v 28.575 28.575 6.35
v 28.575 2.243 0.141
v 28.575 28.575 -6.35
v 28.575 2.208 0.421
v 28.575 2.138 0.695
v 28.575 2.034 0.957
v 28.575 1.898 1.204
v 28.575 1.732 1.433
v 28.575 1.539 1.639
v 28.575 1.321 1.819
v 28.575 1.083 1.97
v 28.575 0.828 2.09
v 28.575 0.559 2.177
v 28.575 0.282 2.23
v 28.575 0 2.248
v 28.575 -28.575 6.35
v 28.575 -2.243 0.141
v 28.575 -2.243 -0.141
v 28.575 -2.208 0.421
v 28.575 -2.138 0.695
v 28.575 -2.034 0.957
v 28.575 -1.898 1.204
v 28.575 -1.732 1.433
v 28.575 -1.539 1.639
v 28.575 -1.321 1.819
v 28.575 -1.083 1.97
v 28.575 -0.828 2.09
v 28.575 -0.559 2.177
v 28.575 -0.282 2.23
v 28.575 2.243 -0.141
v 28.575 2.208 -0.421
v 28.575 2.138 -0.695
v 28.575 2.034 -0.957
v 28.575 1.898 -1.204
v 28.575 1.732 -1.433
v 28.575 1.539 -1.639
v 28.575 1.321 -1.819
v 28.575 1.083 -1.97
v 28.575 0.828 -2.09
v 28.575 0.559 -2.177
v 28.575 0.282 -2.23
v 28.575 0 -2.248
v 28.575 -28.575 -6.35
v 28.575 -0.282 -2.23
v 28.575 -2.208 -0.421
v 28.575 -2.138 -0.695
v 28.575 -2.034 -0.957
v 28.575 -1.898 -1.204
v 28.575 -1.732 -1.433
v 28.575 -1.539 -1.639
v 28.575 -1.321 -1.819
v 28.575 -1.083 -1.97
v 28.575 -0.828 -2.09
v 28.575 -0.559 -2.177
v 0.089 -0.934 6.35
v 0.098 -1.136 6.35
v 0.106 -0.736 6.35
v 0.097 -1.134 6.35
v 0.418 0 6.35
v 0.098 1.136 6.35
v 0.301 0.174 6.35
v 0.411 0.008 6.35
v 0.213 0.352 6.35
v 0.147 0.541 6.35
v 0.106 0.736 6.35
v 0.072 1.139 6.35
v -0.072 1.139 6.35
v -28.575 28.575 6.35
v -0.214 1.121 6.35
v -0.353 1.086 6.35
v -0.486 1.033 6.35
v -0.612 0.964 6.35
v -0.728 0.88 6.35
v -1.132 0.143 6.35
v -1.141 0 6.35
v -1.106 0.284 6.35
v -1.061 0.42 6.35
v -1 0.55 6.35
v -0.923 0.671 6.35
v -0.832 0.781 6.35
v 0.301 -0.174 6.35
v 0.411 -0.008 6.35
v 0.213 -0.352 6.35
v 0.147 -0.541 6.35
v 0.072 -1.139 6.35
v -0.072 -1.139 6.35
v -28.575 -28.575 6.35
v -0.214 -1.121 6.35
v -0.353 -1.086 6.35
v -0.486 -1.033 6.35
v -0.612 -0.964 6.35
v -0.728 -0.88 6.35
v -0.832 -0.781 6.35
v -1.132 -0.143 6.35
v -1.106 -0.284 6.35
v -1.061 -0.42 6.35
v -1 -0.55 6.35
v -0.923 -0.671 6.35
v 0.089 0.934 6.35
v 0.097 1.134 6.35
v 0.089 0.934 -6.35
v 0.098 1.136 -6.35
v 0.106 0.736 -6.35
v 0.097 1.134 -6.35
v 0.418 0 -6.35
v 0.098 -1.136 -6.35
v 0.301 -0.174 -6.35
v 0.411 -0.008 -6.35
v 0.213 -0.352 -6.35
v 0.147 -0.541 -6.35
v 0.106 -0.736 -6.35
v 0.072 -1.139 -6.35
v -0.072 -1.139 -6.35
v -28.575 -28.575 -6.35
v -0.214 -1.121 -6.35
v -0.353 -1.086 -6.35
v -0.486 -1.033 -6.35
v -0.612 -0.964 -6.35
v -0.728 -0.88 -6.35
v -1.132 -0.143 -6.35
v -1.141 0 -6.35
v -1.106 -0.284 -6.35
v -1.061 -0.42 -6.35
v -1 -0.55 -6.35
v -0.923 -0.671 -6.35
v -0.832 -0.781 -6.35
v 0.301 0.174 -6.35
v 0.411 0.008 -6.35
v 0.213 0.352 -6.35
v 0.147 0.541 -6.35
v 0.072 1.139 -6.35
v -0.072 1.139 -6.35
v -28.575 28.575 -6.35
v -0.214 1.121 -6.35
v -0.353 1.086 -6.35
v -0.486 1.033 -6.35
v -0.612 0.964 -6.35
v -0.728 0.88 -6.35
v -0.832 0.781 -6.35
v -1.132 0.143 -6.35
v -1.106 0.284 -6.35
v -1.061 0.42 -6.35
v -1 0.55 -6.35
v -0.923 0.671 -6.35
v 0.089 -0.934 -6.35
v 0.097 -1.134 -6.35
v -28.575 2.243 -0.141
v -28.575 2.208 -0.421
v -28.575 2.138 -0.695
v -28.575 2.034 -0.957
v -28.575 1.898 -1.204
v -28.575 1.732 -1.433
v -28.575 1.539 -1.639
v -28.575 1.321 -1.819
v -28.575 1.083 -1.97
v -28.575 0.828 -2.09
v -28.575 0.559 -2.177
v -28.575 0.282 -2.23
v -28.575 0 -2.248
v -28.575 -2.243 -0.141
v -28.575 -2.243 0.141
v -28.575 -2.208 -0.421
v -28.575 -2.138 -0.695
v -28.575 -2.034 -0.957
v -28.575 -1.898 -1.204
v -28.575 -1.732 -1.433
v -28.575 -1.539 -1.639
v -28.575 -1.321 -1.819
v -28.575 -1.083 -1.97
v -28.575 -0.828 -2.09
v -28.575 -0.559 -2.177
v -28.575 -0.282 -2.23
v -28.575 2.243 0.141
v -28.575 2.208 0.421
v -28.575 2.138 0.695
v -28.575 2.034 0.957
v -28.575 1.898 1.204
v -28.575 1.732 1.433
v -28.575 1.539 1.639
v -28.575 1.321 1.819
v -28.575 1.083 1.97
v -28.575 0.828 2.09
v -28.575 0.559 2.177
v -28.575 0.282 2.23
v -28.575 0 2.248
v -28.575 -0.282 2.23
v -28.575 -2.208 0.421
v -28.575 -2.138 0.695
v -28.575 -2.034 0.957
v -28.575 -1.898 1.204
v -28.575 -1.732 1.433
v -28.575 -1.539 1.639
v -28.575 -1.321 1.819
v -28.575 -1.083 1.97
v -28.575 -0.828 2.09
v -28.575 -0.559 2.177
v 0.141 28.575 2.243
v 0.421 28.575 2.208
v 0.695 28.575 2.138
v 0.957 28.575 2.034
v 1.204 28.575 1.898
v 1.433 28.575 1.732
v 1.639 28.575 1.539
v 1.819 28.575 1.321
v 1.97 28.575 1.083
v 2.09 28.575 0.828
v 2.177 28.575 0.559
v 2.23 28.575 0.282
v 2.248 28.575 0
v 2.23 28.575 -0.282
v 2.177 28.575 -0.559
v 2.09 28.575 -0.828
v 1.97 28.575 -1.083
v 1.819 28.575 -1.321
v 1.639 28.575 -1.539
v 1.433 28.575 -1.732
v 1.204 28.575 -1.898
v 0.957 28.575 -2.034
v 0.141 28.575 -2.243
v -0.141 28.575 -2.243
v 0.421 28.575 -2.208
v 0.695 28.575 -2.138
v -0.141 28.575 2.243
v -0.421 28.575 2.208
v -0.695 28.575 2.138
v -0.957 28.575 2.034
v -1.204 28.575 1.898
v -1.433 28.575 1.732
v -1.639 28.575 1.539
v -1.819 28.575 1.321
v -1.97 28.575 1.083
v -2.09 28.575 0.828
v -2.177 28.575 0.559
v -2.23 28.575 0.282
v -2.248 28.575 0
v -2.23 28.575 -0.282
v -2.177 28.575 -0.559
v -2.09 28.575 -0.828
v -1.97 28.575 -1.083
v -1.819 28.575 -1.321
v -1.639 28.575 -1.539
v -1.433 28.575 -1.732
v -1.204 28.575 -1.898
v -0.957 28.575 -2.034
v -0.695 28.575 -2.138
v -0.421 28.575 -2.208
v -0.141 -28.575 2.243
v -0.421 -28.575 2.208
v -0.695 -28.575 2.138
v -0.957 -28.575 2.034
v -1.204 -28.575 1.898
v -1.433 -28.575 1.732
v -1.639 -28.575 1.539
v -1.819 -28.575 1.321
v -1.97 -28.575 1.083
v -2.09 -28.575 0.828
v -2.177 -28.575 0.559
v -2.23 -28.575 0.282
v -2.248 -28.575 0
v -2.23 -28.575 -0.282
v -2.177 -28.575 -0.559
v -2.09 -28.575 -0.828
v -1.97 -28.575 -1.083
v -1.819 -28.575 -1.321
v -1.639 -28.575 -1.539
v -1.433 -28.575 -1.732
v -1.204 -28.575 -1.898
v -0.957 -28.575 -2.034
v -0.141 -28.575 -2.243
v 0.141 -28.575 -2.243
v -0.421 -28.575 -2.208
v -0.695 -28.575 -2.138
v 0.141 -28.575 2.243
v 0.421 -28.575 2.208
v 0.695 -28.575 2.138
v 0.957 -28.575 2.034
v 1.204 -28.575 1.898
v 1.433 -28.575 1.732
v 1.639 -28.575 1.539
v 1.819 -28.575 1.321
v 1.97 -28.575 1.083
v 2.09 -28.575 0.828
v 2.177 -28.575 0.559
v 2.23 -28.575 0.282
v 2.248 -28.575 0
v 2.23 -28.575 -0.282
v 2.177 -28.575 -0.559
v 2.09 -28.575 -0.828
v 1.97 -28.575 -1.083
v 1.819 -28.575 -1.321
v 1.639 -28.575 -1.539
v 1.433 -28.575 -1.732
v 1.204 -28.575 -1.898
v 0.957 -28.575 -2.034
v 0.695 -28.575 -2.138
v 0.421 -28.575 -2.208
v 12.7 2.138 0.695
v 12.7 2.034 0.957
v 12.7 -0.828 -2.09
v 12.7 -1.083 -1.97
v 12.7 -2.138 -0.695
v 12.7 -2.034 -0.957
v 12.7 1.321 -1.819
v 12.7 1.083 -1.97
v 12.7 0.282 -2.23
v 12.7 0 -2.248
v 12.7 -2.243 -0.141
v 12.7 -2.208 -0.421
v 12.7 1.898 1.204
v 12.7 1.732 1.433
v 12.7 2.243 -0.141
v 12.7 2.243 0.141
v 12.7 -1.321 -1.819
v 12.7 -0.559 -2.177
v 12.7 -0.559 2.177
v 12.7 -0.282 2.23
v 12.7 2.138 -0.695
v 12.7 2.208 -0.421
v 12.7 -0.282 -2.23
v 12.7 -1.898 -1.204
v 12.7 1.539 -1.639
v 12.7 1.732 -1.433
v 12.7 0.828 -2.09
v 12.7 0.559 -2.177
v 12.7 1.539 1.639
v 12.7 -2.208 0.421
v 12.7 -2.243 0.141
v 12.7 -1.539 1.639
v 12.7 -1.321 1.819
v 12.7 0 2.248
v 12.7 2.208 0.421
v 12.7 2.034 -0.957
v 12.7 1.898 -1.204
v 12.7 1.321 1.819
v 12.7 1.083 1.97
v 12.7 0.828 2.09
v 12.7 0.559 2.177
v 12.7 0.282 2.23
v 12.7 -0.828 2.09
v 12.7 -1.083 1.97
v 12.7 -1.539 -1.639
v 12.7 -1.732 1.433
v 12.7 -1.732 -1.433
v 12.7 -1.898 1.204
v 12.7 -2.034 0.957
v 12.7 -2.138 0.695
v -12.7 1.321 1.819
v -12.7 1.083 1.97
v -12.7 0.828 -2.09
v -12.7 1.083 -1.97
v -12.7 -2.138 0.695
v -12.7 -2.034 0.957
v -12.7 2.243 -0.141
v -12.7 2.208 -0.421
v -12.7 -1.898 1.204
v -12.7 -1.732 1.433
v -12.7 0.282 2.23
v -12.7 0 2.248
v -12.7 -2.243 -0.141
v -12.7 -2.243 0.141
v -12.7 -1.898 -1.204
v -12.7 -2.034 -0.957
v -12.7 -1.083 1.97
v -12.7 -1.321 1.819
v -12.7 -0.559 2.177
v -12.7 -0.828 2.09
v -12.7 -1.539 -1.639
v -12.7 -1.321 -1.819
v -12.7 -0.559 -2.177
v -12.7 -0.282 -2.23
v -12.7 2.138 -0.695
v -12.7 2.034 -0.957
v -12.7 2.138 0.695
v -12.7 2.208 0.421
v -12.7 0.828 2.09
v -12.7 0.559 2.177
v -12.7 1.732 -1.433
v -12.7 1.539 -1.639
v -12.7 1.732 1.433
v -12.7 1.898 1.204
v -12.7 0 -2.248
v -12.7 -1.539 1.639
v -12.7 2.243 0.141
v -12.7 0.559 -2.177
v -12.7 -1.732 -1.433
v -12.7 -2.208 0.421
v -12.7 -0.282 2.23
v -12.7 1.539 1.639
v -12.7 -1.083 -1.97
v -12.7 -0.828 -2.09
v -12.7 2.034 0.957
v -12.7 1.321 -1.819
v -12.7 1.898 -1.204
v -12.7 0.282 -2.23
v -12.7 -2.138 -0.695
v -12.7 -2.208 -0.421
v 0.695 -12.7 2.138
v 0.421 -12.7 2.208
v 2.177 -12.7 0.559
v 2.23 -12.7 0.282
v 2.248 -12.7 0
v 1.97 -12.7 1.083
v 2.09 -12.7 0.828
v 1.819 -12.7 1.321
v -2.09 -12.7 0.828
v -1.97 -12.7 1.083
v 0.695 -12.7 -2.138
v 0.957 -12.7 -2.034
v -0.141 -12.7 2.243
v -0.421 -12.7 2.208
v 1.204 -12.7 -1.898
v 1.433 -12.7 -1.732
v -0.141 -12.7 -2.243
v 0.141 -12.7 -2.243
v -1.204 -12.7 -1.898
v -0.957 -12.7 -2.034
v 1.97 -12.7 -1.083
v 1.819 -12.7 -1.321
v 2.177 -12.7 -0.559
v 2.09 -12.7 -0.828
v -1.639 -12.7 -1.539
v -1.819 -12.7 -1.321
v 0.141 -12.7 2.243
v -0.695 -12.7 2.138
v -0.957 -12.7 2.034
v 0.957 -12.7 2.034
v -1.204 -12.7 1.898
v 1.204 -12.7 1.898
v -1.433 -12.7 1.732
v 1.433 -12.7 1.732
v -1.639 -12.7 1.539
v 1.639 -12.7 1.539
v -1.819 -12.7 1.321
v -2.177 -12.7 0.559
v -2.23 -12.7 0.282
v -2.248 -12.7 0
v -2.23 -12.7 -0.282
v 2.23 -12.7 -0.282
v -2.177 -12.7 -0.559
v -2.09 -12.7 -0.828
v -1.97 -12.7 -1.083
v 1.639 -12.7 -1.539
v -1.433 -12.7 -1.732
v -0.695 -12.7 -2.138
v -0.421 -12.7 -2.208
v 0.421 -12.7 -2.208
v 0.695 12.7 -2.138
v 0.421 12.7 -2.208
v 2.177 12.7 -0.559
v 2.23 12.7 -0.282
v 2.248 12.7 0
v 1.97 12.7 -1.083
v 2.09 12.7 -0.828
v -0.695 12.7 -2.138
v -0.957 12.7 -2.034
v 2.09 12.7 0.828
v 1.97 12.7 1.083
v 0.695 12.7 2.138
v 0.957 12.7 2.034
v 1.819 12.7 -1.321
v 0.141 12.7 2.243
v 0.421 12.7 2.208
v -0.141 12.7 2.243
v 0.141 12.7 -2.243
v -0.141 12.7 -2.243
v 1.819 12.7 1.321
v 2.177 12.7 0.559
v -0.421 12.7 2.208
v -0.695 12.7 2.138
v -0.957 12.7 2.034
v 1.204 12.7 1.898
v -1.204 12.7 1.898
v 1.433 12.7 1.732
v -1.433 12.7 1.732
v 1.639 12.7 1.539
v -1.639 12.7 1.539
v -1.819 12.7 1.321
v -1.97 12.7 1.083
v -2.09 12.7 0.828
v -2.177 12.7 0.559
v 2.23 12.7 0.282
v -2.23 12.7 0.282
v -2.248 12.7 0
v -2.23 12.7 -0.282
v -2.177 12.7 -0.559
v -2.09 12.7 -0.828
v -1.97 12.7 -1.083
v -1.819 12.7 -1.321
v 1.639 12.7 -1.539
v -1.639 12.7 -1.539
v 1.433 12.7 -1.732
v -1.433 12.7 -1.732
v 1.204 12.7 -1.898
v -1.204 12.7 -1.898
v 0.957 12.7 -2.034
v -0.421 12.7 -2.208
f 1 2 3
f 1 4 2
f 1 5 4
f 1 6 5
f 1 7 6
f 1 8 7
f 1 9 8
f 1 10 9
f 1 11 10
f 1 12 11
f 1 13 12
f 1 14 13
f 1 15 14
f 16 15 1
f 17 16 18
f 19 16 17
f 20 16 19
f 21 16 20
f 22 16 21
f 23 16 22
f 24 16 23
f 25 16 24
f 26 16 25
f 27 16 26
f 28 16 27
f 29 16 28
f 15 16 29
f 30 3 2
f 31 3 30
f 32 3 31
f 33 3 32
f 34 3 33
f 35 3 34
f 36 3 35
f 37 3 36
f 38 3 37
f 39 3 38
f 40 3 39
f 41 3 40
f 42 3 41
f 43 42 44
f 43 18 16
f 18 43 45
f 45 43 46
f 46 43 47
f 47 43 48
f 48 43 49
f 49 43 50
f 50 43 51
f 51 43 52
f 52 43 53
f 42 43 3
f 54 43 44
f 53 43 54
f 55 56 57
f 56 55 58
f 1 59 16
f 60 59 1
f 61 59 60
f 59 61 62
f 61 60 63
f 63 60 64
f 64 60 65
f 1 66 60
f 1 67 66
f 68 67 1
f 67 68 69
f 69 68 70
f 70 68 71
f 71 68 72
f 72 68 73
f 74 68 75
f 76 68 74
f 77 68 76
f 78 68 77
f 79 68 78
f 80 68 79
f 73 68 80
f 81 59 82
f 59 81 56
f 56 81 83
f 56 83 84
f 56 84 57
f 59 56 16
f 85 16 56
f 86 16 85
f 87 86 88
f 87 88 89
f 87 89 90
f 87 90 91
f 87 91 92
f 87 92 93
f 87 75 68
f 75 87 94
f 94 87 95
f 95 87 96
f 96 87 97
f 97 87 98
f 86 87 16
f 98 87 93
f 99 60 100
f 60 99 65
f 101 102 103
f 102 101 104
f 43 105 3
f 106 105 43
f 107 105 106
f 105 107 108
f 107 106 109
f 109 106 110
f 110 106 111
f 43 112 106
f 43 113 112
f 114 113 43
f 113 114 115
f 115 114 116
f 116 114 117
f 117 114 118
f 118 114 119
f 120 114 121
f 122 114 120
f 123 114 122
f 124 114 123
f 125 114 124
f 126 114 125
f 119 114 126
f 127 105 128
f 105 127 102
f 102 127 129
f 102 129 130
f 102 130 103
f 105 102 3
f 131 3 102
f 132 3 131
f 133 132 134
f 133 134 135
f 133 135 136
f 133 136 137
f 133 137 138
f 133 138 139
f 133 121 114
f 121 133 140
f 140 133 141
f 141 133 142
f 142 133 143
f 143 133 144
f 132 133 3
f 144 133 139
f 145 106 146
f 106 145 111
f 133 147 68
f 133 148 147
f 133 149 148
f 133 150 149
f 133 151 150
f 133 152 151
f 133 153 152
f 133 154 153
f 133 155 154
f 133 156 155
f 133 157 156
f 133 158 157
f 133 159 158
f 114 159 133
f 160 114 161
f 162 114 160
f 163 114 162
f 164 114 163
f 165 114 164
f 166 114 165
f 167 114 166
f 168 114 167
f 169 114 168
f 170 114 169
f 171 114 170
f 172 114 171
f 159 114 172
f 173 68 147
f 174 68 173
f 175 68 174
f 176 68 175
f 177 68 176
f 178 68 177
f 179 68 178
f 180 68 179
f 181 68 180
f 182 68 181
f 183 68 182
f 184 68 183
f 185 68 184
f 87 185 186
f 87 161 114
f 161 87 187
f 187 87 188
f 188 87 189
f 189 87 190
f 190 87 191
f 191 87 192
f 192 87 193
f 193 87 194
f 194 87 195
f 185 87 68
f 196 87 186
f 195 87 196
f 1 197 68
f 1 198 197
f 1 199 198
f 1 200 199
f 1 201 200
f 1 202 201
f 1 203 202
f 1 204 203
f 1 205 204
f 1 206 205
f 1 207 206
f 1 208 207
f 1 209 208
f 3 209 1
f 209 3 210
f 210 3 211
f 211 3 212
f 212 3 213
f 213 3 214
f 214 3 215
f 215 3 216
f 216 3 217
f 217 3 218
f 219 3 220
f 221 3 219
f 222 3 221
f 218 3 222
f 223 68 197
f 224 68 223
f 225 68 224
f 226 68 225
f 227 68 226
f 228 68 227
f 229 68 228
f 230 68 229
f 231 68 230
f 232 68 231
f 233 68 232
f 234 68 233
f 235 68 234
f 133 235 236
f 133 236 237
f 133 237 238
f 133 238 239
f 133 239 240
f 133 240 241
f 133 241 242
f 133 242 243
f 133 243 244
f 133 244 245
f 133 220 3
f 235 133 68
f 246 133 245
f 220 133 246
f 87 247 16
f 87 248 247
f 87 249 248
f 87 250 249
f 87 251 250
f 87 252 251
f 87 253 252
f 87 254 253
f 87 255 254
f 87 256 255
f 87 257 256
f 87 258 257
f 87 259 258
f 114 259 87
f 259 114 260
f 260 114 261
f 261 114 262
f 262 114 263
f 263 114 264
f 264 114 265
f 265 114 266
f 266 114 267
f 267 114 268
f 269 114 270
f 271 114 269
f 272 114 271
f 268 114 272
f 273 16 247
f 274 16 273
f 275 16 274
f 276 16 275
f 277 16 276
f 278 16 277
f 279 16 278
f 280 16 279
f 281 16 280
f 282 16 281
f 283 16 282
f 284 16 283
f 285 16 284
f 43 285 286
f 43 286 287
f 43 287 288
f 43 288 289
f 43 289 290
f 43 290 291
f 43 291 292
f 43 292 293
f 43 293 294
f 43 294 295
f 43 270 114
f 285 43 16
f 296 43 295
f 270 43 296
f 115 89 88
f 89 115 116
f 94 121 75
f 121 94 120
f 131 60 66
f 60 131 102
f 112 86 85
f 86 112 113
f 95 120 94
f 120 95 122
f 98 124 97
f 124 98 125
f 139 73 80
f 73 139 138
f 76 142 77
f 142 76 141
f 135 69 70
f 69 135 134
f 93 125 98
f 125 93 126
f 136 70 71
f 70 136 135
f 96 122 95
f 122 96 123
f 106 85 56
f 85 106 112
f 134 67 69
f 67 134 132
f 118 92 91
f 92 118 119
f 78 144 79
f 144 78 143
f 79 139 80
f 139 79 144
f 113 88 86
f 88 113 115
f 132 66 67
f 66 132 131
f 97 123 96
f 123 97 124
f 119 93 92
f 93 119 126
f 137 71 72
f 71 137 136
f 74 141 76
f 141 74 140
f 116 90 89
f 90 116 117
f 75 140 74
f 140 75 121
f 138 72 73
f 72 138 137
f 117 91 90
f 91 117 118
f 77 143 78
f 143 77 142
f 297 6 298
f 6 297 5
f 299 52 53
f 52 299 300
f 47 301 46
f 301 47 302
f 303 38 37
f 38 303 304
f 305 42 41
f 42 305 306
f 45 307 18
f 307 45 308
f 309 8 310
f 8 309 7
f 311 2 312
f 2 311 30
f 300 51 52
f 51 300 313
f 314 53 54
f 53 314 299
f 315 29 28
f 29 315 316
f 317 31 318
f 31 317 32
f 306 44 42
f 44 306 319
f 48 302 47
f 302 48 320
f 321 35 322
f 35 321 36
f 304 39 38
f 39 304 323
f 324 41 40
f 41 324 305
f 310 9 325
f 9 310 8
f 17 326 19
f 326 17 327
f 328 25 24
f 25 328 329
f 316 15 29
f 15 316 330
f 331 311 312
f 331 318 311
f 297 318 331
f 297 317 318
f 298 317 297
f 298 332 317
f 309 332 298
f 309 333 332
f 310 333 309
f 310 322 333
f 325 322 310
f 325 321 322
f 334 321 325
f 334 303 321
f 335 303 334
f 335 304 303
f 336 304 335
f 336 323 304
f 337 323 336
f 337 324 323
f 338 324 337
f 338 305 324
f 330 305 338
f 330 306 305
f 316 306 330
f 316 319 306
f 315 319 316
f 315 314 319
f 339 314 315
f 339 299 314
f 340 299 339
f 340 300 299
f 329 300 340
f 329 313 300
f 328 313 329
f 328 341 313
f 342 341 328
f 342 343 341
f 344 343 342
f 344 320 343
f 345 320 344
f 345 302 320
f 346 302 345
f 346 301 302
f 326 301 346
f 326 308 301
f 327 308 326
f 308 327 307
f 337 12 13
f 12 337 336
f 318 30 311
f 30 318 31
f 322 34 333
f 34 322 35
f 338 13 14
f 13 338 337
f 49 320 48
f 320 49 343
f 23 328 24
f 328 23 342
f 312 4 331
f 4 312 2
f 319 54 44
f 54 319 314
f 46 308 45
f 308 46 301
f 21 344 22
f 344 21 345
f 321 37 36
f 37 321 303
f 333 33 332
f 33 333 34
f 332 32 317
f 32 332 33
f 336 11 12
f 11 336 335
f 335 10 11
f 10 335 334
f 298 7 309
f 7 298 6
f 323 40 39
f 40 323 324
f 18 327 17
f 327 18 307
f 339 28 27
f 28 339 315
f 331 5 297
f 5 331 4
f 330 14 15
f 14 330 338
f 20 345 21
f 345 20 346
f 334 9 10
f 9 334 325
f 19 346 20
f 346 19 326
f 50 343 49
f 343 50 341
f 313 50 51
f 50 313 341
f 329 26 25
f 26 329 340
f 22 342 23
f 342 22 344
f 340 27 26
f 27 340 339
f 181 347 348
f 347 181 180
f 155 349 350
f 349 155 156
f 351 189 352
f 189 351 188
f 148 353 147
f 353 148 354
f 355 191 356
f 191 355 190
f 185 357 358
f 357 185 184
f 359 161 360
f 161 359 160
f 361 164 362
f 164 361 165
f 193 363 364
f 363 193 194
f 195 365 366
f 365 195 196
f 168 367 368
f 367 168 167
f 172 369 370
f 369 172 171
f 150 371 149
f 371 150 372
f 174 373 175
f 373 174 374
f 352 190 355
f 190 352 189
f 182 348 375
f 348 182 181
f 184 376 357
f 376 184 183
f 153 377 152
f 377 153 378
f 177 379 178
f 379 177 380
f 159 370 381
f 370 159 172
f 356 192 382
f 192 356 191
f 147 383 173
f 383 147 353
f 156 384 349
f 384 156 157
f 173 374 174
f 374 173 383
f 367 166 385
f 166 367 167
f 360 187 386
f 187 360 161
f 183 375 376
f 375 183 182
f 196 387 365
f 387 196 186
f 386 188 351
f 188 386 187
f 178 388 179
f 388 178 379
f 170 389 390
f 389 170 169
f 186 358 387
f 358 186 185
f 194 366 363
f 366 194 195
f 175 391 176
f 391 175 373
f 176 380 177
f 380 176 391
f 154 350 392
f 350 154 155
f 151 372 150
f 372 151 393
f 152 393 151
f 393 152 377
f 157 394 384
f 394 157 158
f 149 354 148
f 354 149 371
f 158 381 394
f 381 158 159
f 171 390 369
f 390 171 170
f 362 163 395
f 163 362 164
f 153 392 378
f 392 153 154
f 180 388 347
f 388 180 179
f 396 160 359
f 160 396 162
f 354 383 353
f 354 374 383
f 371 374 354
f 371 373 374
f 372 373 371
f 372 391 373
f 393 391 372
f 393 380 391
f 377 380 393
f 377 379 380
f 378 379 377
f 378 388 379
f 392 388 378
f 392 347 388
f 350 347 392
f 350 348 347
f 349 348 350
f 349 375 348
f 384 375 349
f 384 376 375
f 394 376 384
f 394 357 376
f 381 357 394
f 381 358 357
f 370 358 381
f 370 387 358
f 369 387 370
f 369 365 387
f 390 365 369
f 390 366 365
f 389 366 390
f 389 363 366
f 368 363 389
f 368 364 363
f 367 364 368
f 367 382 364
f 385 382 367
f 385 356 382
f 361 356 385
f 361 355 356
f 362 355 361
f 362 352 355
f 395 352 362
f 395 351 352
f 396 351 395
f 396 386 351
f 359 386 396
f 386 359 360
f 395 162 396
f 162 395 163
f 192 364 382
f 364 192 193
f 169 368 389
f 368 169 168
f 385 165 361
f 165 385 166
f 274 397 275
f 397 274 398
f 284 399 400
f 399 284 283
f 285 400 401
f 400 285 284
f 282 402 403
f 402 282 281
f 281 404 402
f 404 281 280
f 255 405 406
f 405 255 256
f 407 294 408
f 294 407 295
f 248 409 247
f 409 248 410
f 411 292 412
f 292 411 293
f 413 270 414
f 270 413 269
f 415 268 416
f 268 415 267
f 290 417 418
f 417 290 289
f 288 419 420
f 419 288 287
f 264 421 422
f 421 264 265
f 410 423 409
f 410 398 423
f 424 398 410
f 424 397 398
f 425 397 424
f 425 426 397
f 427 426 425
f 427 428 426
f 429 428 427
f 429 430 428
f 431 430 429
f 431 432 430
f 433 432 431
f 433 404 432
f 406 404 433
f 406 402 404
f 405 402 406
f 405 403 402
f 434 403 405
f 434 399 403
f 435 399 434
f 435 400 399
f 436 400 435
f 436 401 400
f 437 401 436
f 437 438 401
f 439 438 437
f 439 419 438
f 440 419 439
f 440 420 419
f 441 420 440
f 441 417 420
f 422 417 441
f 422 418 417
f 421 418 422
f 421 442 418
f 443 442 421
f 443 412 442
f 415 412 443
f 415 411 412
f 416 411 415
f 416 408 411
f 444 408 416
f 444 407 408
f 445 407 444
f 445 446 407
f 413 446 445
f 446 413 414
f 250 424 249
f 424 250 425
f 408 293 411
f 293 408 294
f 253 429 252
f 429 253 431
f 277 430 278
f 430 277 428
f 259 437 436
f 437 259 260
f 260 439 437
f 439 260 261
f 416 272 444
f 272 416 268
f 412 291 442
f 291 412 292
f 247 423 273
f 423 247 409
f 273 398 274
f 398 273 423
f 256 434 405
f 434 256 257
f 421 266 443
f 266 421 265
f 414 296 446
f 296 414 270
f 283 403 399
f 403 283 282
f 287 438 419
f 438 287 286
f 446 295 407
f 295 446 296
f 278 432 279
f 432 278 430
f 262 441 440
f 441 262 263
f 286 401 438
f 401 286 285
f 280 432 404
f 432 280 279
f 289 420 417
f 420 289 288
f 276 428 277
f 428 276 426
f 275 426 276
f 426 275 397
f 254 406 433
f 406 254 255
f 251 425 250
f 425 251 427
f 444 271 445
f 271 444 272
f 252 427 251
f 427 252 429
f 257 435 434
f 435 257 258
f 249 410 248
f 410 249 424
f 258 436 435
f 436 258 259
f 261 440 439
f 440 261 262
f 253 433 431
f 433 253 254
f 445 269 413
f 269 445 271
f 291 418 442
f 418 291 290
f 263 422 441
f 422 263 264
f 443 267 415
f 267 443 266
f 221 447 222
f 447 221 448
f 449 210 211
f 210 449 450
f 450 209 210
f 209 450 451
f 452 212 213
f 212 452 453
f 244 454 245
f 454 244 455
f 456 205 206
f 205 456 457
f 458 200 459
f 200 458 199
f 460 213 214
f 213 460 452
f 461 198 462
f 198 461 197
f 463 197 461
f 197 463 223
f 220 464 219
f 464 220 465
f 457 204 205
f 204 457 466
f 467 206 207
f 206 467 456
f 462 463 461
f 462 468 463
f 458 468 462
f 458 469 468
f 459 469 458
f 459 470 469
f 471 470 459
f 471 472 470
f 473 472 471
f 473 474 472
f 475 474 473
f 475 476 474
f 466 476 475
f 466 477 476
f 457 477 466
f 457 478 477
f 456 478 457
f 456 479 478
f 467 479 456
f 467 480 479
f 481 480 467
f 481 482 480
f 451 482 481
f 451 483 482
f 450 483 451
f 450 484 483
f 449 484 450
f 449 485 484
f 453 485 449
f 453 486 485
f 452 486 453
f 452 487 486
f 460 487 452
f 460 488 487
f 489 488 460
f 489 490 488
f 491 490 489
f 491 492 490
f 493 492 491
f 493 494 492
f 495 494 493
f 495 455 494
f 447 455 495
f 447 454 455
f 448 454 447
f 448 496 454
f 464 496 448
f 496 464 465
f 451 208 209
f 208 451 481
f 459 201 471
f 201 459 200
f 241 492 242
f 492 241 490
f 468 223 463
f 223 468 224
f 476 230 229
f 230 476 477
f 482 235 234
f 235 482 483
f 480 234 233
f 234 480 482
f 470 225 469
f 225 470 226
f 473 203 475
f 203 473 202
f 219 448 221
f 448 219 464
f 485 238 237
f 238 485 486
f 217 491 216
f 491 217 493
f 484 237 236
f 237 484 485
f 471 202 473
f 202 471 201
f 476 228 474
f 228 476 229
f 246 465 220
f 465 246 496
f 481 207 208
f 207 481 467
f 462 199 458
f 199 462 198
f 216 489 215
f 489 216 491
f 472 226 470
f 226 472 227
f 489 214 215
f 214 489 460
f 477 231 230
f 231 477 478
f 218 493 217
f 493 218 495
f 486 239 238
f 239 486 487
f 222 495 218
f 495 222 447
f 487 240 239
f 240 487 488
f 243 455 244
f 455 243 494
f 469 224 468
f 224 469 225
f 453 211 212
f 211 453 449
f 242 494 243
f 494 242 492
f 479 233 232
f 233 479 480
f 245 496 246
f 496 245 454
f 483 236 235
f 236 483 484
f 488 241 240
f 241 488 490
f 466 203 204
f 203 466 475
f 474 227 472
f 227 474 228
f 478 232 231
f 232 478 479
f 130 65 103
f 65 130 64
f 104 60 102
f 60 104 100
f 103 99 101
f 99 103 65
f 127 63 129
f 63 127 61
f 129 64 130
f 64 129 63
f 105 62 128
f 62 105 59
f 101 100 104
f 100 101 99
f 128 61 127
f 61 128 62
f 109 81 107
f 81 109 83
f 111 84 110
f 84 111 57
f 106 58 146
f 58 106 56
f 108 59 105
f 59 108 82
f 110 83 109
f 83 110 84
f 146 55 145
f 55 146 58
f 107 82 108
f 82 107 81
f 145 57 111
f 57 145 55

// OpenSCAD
$fn = 50;
//$fa = 0.01;
//$fs = 0.5;


in=25.4;
l=1.5*in;
lSide=2.25*in;
w=l;
h=0.5*in;
d=1*in;

dHole=1.775+0.02*in;
dLip=dHole;

d8=0.136*in;
d4=0.177*in;
p=0.125*in;

render(convexity=3)
{

		union()
		{
		difference()
		{
		cube([lSide,lSide,h], center=true); //Body 
		translate([0,0,-h*0.275]) cylinder(h=100, r=dHole/2); //Hole
		translate([0,0,-10]) cylinder(h=100, r=dLip/2); //Lip diameter

		rotate([0,90,0]) translate([0,0,1.0*d/2]) cylinder(h=1*d, r=d4/2, center=false); //Edge screw hole
		rotate([0,-90,0]) translate([0,0,1.0*d/2]) cylinder(h=1*d, r=d4/2, center=false); //Edge screw hole
		rotate([90,0,0]) translate([0,0,1.0*d/2]) cylinder(h=d, r=d4/2, center=false); //Edge screw hole
		rotate([-90,0,0]) translate([0,0,1.0*d/2]) cylinder(h=d, r=d4/2, center=false); //Edge screw hole


		//rotate([90,0,0]) cylinder(h=2*d, r=d8/2, center=true);
		
		//translate([15,15,0]) cylinder(h=100, r=3, center=true);
//		translate([15,-15,0]) cylinder(h=100, r=3, center=true);
//		translate([-15,15,0]) cylinder(h=100, r=3, center=true);
//		translate([-15,-15,0]) cylinder(h=100, r=3, center=true);


		}
	rotate([0,0,30])translate([dHole/2+p/4, 0, 0]) cylinder(h=h, r=p/2, center=true);
	rotate([0,0,-30])translate([dHole/2+p/4, 0, 0]) cylinder(h=h, r=p/2, center=true);

		}
	
}
